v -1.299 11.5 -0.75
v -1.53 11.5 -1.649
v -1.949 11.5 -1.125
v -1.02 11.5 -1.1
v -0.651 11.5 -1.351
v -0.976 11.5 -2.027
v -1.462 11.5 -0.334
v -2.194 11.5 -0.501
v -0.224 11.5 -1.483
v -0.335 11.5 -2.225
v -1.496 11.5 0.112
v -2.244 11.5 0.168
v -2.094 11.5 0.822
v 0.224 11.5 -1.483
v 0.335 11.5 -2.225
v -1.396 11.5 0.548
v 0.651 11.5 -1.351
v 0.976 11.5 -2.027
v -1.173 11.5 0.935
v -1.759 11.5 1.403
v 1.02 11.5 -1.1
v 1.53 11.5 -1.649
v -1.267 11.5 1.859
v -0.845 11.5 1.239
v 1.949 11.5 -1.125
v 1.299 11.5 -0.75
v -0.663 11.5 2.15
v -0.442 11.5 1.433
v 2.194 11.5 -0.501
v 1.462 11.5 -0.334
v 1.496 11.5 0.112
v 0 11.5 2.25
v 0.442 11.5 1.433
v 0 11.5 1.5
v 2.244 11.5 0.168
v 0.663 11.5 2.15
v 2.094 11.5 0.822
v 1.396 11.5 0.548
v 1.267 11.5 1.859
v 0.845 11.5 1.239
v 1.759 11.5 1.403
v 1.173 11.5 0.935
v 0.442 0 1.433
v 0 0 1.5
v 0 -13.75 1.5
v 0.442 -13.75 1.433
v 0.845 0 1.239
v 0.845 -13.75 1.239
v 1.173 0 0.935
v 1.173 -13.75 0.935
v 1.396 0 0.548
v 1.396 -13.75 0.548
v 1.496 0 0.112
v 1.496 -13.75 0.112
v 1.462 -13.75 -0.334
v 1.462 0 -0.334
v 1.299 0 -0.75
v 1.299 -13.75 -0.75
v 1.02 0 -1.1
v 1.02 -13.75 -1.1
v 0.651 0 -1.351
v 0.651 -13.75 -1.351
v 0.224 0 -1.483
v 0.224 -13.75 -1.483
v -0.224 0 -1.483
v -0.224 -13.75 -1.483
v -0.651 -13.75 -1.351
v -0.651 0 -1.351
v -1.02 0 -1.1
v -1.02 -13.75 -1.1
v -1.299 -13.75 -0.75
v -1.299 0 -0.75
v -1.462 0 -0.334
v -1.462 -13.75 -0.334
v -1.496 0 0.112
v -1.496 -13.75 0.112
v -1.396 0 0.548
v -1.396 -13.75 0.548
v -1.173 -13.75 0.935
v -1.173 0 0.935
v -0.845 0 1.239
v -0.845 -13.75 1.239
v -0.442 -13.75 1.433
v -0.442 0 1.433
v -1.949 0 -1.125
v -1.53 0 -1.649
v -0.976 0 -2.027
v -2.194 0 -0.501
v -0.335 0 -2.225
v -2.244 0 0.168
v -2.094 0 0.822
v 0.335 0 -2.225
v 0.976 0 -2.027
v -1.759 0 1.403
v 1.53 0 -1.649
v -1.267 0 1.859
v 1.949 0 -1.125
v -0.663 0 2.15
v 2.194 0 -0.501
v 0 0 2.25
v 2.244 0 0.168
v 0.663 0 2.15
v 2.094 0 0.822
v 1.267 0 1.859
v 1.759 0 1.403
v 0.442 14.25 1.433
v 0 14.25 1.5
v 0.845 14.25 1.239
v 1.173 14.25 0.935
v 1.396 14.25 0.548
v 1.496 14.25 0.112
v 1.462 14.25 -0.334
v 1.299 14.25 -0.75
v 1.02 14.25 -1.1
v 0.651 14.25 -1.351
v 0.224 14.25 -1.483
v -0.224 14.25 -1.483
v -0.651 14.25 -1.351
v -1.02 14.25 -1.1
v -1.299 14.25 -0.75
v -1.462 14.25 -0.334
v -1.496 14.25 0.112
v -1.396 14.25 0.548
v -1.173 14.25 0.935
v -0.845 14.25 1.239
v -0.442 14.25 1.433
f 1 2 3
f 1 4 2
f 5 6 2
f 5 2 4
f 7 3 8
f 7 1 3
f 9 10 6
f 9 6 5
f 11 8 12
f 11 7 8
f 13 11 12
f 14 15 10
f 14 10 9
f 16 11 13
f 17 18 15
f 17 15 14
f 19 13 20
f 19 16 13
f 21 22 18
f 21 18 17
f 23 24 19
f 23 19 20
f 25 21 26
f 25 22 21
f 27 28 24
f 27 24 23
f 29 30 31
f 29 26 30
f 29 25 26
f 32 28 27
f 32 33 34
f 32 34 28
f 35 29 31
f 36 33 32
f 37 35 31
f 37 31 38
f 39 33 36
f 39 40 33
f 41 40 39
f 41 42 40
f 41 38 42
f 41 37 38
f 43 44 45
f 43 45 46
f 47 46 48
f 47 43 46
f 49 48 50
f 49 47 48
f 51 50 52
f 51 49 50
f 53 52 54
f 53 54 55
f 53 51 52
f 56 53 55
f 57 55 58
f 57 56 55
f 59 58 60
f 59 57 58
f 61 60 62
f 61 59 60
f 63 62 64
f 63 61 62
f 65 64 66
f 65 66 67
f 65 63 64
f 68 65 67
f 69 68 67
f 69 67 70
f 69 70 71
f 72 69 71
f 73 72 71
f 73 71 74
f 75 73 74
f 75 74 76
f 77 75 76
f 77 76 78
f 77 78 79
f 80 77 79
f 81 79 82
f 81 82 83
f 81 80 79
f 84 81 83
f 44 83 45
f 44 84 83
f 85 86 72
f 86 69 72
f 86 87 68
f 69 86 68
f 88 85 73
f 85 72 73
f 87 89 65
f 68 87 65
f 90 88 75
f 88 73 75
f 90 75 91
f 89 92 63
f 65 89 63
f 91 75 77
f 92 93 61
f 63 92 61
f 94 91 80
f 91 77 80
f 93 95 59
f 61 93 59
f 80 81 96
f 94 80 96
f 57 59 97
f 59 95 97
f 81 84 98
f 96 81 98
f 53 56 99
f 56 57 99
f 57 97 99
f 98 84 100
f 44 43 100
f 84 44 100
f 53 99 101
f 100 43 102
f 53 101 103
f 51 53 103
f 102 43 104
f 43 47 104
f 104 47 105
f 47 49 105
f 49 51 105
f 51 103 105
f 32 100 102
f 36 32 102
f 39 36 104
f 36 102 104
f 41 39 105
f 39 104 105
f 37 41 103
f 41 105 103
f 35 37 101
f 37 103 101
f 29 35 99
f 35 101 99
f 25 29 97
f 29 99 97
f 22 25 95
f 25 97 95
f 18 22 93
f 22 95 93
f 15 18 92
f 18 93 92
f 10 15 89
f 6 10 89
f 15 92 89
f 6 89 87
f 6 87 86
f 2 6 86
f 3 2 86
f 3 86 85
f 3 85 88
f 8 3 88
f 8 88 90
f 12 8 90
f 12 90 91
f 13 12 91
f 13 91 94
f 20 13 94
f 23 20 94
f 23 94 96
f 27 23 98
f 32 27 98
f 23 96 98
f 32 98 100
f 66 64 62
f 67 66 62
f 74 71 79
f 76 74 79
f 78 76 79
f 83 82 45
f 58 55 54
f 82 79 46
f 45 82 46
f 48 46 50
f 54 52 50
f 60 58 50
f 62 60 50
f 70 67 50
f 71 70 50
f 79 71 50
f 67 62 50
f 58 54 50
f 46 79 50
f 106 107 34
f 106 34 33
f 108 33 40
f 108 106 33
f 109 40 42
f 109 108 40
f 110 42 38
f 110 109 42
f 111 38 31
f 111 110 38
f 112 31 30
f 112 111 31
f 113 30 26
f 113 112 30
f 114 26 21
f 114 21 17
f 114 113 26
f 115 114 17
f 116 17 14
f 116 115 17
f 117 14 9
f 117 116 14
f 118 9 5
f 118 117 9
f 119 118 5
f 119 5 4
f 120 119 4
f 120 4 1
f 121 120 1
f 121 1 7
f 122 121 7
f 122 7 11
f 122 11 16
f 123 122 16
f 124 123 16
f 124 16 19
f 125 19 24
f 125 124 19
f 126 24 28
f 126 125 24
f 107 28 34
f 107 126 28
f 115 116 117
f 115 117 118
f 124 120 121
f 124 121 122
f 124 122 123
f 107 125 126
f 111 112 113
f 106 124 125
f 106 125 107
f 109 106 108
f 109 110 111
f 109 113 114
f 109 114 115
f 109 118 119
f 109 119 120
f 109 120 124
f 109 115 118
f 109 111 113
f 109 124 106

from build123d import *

# Parameters (mm, degrees)
SKETCH1_R           = 1.5
BOSS_EXTRUDE1_DEPTH = 13.75
SKETCH2_R           = 2.25
BOSS_EXTRUDE2_DEPTH = 11.5
BOSS_EXTRUDE3_START = 2.75
SKETCH3_R           = 1.5
BOSS_EXTRUDE3_DEPTH = 2.75


with BuildPart() as part:
    # Sketch1 → Boss-Extrude1 (new body)
    with BuildSketch(Plane(origin=(0, 0, 0), x_dir=(1, 0, 0), z_dir=(0, 1, 0))):
        with Locations(Location((0, 0, 0), (0, 0, 270))):
            Circle(SKETCH1_R)
    extrude(amount=-BOSS_EXTRUDE1_DEPTH)

    # Sketch2 → Boss-Extrude2 (add)
    with BuildSketch(Plane(origin=(0, 0, 0), x_dir=(1, 0, 0), z_dir=(0, 1, 0))):
        with Locations(Location((0, 0, 0), (0, 0, 270))):
            Circle(SKETCH2_R)
    extrude(amount=BOSS_EXTRUDE2_DEPTH)

    # Sketch3 → Boss-Extrude3 (add)
    with BuildSketch(Plane(origin=(0, 11.5, 0), x_dir=(1, 0, 0), z_dir=(0, 1, 0)).offset(BOSS_EXTRUDE3_START)):
        with Locations(Location((0, 0, 0), (0, 0, 270))):
            Circle(SKETCH3_R)
    extrude(amount=-BOSS_EXTRUDE3_DEPTH)


solid = part.part
